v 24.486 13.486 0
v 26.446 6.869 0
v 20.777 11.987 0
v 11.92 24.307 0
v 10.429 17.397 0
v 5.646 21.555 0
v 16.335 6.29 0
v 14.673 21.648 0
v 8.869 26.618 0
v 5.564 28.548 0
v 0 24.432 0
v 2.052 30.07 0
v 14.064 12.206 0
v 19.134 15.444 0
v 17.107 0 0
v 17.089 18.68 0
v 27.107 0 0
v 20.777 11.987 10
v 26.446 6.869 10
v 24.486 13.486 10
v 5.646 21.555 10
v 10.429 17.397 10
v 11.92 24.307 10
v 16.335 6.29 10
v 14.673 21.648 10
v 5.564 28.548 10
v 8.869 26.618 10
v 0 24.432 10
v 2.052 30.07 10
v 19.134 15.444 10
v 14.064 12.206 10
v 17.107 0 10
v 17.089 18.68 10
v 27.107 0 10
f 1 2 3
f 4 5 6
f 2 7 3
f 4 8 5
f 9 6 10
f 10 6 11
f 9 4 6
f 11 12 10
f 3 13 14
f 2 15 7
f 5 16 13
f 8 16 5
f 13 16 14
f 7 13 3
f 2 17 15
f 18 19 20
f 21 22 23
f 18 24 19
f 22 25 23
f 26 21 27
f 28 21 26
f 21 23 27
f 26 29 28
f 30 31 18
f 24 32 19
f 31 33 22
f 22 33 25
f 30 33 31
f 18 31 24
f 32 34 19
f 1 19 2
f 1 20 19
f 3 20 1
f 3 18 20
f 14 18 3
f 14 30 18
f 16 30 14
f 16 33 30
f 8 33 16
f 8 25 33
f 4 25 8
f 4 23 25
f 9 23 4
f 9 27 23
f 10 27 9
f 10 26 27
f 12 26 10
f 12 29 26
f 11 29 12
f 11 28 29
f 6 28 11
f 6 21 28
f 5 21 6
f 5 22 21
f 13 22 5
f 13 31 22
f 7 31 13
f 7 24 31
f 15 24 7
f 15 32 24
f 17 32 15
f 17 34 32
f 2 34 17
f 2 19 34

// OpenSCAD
$fn = 32;

// ----------------------------------------------------------------------
// Arc stop: segment, 10 mm thick
// ----------------------------------------------------------------------

// --- parameters (mm) ---
profile_height = 10;      // extrusion height
profile_points = 17;      // points of the closed outline

profile = [[27.107, 0], [26.446, 6.869], [24.486, 13.486], [20.777, 11.987], [19.134, 15.444], [17.089, 18.68], [14.673, 21.648], [11.92, 24.307], [8.869, 26.618], [5.564, 28.548], [2.052, 30.07], [0, 24.432], [5.646, 21.555], [10.429, 17.397], [14.064, 12.206], [16.335, 6.29], [17.107, 0]];  // single closed polygon, 17 points, counter clockwise

// --- the one profile operation ---
linear_extrude(height = profile_height) polygon(points = profile);
